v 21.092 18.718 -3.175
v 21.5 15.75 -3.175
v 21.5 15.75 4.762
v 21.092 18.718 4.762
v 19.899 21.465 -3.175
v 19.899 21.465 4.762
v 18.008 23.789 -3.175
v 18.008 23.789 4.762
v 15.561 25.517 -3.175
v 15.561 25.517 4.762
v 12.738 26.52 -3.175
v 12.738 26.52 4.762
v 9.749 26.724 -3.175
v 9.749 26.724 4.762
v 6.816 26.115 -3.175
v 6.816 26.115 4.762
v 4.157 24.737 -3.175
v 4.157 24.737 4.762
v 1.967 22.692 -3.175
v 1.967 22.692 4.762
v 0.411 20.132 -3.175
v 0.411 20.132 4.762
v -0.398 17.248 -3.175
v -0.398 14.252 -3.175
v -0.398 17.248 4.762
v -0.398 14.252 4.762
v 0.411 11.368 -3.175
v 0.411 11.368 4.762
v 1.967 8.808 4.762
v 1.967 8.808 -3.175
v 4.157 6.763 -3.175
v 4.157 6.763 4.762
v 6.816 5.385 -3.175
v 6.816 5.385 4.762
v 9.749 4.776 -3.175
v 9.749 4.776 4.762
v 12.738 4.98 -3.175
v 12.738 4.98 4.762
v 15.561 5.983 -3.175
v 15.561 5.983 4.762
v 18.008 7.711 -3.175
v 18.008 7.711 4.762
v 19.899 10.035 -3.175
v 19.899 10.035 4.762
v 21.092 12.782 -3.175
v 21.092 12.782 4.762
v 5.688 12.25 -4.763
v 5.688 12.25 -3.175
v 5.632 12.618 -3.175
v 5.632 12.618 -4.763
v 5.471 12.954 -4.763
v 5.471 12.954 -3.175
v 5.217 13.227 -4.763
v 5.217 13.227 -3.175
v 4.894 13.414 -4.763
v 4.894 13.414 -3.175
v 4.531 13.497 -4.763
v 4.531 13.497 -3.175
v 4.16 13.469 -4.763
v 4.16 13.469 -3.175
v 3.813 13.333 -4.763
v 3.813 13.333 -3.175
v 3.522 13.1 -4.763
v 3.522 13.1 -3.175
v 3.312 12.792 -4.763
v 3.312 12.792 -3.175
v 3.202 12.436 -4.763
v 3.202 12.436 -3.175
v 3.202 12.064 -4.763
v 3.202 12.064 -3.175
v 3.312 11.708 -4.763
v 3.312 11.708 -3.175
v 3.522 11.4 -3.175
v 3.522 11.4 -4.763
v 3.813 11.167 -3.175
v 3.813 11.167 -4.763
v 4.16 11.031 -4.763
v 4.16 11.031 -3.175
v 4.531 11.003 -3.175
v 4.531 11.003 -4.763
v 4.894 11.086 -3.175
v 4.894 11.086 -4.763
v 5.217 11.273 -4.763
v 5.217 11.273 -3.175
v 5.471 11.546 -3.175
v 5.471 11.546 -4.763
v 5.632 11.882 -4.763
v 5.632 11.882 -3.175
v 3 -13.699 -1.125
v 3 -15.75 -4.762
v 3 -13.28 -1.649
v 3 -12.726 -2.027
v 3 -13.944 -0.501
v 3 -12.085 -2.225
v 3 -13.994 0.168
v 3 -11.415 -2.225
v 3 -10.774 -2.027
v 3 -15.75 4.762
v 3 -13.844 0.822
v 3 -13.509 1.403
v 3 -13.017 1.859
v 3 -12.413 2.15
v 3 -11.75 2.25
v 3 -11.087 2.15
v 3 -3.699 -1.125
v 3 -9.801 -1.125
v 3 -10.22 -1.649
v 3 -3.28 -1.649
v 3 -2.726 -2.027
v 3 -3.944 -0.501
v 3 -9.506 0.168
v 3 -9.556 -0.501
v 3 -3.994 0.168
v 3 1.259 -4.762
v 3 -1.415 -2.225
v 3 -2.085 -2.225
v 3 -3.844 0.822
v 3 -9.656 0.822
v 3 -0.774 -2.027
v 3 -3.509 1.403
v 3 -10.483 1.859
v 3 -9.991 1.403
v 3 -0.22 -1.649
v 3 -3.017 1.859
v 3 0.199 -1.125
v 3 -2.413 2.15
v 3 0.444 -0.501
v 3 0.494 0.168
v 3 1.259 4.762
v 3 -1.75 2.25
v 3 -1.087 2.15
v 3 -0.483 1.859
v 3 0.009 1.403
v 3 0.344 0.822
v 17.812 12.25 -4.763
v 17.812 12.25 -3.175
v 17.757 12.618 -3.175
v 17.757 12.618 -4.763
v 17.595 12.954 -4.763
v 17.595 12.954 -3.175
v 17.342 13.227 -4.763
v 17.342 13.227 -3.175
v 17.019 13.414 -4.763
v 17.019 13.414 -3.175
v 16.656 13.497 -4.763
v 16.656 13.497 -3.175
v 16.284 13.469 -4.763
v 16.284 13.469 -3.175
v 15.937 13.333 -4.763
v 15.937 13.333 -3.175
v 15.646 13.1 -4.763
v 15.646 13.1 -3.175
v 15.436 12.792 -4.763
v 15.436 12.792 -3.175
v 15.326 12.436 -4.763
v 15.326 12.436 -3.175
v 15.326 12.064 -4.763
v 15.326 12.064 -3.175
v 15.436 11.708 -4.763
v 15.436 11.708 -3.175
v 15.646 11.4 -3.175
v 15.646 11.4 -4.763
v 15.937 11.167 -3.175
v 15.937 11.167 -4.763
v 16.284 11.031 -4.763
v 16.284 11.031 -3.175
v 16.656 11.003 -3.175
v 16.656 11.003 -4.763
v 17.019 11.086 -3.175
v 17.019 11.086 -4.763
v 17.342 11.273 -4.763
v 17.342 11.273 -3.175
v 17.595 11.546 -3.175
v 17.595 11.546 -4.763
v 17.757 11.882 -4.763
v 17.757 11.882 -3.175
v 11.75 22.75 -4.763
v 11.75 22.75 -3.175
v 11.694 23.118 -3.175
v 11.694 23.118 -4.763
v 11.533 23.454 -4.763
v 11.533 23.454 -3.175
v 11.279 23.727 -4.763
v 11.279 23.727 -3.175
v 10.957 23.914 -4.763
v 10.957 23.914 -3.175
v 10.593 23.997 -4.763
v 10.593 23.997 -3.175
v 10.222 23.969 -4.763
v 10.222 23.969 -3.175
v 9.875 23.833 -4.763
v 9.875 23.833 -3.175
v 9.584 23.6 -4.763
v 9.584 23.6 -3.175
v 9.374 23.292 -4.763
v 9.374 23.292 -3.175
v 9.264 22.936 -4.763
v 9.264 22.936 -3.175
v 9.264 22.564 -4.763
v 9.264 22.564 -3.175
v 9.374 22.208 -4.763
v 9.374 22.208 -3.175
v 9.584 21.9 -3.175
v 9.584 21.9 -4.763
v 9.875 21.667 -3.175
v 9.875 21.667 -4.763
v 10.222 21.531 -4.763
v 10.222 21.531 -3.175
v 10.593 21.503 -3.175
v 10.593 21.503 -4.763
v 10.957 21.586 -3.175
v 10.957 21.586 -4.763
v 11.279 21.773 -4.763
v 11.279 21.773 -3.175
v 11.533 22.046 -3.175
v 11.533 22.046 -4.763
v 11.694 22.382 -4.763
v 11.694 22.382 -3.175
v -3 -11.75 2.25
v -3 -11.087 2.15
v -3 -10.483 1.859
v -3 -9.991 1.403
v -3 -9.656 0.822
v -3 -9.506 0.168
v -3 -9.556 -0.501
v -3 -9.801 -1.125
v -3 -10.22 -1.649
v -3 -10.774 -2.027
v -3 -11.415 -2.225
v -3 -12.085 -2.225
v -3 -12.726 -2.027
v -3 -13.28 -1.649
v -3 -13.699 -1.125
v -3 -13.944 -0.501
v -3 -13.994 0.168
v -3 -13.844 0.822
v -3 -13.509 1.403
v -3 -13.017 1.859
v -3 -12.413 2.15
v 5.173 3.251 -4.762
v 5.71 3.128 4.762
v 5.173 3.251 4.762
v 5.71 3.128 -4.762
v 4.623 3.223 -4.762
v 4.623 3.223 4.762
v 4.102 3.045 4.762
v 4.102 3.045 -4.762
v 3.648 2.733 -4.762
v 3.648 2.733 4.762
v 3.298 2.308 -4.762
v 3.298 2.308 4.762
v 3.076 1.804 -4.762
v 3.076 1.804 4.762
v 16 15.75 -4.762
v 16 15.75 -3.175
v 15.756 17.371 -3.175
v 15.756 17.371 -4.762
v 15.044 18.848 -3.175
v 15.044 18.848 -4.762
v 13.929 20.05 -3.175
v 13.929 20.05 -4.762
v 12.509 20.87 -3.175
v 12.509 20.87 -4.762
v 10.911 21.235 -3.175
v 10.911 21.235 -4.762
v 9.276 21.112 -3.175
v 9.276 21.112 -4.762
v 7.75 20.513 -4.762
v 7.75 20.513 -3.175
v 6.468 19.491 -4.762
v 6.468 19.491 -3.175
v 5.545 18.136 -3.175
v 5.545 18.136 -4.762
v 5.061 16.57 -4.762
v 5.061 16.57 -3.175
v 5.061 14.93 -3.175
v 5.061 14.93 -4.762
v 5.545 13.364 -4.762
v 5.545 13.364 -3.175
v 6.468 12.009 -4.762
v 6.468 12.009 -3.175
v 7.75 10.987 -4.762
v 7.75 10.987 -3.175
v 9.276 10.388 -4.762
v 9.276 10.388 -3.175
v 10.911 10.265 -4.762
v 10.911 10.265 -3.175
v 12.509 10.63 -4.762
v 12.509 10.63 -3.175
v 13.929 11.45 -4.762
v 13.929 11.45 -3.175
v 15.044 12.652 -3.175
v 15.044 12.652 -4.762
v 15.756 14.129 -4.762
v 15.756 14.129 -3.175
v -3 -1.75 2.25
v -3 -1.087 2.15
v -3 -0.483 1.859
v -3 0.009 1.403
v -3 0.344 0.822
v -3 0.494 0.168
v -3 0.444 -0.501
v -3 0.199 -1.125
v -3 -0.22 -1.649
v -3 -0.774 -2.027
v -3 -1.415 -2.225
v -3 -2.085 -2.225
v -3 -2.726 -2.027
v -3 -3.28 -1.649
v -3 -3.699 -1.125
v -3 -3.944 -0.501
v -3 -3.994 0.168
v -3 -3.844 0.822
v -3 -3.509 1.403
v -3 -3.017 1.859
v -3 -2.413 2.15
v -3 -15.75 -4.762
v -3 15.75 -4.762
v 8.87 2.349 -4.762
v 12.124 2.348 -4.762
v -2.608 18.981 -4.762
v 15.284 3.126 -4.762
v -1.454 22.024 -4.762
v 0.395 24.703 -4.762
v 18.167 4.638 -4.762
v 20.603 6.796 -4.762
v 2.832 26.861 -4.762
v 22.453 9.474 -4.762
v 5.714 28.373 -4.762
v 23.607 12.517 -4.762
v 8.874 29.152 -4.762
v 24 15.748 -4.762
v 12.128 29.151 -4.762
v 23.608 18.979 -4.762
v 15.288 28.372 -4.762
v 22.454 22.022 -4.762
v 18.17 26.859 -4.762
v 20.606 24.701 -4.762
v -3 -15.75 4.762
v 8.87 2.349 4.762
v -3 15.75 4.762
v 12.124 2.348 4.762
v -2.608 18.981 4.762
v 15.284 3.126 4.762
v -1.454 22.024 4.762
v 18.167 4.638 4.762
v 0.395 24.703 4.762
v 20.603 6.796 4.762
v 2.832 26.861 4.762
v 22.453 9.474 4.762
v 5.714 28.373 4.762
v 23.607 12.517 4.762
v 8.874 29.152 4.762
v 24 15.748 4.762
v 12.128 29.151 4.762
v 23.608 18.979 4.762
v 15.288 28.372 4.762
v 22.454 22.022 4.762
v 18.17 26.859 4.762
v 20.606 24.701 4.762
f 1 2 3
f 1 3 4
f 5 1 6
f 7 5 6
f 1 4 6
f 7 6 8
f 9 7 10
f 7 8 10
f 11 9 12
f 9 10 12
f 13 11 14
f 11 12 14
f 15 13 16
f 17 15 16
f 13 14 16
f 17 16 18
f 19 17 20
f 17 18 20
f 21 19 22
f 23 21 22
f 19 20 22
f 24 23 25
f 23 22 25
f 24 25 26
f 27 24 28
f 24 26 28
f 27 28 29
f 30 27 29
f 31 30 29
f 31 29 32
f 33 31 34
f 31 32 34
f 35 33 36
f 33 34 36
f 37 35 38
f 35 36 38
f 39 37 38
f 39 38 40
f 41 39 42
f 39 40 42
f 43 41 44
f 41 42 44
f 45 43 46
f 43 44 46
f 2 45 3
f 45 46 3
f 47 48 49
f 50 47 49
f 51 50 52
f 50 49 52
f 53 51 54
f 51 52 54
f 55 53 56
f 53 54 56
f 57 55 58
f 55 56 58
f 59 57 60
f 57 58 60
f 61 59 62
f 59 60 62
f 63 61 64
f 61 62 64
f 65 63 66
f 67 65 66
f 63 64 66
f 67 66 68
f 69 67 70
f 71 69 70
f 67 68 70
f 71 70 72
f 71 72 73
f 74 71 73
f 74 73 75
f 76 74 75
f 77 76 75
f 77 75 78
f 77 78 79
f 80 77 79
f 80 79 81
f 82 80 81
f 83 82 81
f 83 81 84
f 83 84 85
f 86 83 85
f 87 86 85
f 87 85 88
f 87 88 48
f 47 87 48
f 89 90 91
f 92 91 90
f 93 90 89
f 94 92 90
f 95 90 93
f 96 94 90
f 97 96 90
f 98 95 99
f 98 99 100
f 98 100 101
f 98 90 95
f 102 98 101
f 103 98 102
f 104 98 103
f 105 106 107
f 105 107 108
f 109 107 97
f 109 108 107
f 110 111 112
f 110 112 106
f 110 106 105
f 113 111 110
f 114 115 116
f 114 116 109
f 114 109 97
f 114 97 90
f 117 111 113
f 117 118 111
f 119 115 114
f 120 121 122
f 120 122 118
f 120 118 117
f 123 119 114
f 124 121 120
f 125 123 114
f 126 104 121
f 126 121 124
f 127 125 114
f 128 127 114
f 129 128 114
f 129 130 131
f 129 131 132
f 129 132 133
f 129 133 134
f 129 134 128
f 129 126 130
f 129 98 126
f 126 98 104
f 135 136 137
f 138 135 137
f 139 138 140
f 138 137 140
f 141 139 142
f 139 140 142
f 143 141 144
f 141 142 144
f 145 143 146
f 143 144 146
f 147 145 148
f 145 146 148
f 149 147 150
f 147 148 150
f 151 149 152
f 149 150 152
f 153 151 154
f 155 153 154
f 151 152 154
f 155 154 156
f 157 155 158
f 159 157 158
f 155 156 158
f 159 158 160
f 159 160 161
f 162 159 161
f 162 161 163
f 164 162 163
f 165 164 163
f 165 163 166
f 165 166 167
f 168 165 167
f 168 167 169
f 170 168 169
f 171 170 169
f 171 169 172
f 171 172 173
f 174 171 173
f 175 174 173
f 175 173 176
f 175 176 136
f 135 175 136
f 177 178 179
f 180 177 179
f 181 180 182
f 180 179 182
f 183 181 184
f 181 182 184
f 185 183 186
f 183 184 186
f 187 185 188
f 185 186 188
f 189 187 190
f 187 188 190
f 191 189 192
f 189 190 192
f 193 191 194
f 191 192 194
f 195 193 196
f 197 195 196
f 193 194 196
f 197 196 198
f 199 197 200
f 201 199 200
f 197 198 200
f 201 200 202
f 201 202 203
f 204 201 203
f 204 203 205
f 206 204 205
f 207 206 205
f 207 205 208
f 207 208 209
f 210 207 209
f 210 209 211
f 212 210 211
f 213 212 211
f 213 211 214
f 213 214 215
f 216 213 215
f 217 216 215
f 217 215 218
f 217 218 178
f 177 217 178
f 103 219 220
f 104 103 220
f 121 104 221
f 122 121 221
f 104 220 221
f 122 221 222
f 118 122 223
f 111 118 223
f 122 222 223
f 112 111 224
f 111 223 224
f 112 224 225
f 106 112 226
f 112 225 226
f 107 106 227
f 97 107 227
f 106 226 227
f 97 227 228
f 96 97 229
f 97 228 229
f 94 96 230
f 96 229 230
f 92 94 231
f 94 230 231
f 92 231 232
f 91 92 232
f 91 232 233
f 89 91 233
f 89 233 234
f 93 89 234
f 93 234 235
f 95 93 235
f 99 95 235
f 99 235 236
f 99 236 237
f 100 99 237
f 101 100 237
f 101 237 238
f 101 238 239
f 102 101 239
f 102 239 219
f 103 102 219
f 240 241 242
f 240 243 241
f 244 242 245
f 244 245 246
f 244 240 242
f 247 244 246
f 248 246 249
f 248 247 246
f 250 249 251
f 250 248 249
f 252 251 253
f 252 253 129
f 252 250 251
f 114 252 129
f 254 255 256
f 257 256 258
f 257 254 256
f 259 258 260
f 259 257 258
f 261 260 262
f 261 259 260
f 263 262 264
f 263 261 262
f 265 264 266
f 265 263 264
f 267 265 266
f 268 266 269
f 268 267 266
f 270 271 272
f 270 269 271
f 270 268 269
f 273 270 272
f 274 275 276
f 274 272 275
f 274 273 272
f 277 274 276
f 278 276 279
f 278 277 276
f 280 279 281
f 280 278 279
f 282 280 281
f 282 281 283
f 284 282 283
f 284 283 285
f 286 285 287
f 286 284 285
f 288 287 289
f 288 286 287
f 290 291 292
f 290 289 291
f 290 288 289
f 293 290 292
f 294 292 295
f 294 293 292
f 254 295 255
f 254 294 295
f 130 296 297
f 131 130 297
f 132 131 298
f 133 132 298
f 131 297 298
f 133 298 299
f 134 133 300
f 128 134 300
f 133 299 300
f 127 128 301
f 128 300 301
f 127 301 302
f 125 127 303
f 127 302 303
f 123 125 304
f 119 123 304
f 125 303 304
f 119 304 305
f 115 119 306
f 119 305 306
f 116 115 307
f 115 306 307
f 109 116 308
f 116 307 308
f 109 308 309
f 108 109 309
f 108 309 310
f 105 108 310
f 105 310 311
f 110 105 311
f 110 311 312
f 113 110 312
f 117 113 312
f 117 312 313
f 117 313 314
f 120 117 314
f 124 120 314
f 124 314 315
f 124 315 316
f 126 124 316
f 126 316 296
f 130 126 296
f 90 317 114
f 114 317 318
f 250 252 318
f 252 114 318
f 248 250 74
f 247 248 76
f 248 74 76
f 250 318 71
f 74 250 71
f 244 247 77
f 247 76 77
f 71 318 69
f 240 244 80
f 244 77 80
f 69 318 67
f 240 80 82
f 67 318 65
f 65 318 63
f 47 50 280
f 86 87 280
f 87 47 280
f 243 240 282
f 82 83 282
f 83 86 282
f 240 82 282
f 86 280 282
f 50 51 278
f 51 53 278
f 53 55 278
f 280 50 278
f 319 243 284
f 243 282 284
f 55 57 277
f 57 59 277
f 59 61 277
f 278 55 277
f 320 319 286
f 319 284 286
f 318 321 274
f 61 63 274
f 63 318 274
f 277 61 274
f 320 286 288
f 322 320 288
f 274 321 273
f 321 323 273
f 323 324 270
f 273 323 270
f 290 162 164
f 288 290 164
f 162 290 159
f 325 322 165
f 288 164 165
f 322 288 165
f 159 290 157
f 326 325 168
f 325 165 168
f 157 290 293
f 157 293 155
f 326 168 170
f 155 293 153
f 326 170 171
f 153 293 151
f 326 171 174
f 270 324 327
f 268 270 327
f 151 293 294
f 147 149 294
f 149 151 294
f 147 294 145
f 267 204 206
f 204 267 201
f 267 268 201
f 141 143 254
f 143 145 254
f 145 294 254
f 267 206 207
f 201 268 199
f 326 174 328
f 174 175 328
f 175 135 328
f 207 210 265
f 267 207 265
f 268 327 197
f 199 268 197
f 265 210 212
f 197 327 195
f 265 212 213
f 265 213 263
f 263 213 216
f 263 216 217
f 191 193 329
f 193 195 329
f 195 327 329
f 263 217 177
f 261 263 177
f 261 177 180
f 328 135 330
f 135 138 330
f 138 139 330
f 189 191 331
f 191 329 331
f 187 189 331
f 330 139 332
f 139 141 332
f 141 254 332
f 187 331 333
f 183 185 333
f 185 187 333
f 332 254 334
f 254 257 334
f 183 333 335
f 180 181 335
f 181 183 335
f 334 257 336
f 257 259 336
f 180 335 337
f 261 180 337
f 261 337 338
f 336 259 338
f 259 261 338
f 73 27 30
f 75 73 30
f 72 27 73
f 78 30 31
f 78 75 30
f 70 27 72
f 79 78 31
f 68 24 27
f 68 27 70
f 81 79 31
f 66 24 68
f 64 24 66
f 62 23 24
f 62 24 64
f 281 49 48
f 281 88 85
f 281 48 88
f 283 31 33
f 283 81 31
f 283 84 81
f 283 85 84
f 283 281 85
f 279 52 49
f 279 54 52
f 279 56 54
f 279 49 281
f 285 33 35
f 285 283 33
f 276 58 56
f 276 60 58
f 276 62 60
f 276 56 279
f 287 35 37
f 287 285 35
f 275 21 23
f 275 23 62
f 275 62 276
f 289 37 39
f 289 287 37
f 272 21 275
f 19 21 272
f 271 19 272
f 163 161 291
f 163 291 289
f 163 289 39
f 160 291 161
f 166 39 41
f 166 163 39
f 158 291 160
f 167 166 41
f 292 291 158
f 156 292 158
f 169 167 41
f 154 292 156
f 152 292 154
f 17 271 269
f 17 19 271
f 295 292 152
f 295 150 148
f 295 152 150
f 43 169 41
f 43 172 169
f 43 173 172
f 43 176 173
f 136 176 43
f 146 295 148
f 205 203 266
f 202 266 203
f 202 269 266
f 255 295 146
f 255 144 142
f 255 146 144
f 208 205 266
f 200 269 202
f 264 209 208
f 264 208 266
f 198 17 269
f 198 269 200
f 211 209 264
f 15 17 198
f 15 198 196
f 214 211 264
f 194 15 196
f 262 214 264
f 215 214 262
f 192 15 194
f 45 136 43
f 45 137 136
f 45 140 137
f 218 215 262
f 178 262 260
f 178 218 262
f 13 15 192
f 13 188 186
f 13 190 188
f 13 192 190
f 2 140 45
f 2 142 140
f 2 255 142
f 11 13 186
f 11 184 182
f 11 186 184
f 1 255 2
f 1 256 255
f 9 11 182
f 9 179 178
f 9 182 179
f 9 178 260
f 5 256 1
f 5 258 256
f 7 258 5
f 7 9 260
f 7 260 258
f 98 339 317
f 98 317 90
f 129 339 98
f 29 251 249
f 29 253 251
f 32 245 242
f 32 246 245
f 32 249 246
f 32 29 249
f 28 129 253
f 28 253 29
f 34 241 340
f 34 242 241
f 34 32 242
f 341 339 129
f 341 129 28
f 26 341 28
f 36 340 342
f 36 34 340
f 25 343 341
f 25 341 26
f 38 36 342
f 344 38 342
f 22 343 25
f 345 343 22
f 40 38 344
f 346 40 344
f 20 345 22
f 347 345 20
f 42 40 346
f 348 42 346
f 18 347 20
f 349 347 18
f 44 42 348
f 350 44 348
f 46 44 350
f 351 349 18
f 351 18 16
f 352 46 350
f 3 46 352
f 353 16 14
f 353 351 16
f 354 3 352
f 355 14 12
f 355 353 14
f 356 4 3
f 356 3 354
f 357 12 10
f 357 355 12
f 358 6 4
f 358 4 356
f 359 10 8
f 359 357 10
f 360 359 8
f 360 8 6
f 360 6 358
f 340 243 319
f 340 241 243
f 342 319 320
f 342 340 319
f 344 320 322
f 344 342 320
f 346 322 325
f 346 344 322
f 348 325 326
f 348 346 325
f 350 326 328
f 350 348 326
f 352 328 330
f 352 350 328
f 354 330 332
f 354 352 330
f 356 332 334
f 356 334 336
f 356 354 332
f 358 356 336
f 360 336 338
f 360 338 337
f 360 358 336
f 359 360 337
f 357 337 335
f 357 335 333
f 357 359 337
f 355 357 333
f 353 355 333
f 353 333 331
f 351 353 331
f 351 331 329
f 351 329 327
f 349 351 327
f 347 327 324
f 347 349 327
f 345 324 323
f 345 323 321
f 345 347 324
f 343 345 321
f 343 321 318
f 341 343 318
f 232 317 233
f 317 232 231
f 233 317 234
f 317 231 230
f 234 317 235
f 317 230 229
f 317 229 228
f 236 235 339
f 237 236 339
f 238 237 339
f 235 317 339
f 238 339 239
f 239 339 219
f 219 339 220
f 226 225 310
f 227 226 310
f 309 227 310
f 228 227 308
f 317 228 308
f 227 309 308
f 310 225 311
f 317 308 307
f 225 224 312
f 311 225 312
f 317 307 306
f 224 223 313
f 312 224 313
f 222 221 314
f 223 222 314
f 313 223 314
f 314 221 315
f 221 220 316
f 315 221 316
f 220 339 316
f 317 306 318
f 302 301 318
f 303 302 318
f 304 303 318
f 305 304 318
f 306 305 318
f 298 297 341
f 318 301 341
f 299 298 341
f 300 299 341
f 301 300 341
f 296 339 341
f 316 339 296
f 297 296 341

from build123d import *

# Parameters (mm, degrees)
SKETCH2_R             = 13.5
SKETCH2_R_2           = 5.5
SKETCH2_W             = 6
SKETCH2_H             = 31.5
BOSS_EXTRUDE1_DEPTH   = 4.7625
M4_CLEARANCE_HOLE1_D  = 4.5
FILLET1_R             = 2
SKETCH5_R             = 11
CUT_EXTRUDE1_DEPTH    = 7.9375
M3X0_5_TAPPED_HOLE1_D = 2.5


with BuildPart() as part:
    # Sketch2 → Boss-Extrude1 (new body, symmetric)
    with BuildSketch(Plane.XY):
        with Locations((10.5, 15.75)):
            Circle(SKETCH2_R)
        with Locations((10.5, 15.75)):
            Circle(SKETCH2_R_2, mode=Mode.SUBTRACT)
        Rectangle(SKETCH2_W, SKETCH2_H)
    extrude(amount=BOSS_EXTRUDE1_DEPTH, both=True)

    # M4 Clearance Hole1 (through all)
    with Locations(Plane(origin=(3, 0, 0), x_dir=(0, 0, -1), z_dir=(1, 0, 0))):
        with Locations((0, -1.75), (0, -11.75)):
            Hole(M4_CLEARANCE_HOLE1_D / 2)

    # Fillet1
    fillet1_edges = [part.edges().sort_by_distance(p)[0] for p in [
        (3, 4.52502784, 0),
    ]]
    fillet(fillet1_edges, radius=FILLET1_R)

    # Sketch5 → Cut-Extrude1 (cut)
    with BuildSketch(Plane.XY.offset(4.7625)):
        with Locations((10.5, 15.75)):
            Circle(SKETCH5_R)
    extrude(amount=-CUT_EXTRUDE1_DEPTH, mode=Mode.SUBTRACT)

    # M3x0.5 Tapped Hole1 (through all)
    with Locations(Plane(origin=(0, 0, -4.7625), x_dir=(-1, 0, 0), z_dir=(0, 0, -1))):
        with Locations((-10.5, 22.75), (-16.562177826, 12.25), (-4.437822174, 12.25)):
            Hole(M3X0_5_TAPPED_HOLE1_D / 2)


solid = part.part
